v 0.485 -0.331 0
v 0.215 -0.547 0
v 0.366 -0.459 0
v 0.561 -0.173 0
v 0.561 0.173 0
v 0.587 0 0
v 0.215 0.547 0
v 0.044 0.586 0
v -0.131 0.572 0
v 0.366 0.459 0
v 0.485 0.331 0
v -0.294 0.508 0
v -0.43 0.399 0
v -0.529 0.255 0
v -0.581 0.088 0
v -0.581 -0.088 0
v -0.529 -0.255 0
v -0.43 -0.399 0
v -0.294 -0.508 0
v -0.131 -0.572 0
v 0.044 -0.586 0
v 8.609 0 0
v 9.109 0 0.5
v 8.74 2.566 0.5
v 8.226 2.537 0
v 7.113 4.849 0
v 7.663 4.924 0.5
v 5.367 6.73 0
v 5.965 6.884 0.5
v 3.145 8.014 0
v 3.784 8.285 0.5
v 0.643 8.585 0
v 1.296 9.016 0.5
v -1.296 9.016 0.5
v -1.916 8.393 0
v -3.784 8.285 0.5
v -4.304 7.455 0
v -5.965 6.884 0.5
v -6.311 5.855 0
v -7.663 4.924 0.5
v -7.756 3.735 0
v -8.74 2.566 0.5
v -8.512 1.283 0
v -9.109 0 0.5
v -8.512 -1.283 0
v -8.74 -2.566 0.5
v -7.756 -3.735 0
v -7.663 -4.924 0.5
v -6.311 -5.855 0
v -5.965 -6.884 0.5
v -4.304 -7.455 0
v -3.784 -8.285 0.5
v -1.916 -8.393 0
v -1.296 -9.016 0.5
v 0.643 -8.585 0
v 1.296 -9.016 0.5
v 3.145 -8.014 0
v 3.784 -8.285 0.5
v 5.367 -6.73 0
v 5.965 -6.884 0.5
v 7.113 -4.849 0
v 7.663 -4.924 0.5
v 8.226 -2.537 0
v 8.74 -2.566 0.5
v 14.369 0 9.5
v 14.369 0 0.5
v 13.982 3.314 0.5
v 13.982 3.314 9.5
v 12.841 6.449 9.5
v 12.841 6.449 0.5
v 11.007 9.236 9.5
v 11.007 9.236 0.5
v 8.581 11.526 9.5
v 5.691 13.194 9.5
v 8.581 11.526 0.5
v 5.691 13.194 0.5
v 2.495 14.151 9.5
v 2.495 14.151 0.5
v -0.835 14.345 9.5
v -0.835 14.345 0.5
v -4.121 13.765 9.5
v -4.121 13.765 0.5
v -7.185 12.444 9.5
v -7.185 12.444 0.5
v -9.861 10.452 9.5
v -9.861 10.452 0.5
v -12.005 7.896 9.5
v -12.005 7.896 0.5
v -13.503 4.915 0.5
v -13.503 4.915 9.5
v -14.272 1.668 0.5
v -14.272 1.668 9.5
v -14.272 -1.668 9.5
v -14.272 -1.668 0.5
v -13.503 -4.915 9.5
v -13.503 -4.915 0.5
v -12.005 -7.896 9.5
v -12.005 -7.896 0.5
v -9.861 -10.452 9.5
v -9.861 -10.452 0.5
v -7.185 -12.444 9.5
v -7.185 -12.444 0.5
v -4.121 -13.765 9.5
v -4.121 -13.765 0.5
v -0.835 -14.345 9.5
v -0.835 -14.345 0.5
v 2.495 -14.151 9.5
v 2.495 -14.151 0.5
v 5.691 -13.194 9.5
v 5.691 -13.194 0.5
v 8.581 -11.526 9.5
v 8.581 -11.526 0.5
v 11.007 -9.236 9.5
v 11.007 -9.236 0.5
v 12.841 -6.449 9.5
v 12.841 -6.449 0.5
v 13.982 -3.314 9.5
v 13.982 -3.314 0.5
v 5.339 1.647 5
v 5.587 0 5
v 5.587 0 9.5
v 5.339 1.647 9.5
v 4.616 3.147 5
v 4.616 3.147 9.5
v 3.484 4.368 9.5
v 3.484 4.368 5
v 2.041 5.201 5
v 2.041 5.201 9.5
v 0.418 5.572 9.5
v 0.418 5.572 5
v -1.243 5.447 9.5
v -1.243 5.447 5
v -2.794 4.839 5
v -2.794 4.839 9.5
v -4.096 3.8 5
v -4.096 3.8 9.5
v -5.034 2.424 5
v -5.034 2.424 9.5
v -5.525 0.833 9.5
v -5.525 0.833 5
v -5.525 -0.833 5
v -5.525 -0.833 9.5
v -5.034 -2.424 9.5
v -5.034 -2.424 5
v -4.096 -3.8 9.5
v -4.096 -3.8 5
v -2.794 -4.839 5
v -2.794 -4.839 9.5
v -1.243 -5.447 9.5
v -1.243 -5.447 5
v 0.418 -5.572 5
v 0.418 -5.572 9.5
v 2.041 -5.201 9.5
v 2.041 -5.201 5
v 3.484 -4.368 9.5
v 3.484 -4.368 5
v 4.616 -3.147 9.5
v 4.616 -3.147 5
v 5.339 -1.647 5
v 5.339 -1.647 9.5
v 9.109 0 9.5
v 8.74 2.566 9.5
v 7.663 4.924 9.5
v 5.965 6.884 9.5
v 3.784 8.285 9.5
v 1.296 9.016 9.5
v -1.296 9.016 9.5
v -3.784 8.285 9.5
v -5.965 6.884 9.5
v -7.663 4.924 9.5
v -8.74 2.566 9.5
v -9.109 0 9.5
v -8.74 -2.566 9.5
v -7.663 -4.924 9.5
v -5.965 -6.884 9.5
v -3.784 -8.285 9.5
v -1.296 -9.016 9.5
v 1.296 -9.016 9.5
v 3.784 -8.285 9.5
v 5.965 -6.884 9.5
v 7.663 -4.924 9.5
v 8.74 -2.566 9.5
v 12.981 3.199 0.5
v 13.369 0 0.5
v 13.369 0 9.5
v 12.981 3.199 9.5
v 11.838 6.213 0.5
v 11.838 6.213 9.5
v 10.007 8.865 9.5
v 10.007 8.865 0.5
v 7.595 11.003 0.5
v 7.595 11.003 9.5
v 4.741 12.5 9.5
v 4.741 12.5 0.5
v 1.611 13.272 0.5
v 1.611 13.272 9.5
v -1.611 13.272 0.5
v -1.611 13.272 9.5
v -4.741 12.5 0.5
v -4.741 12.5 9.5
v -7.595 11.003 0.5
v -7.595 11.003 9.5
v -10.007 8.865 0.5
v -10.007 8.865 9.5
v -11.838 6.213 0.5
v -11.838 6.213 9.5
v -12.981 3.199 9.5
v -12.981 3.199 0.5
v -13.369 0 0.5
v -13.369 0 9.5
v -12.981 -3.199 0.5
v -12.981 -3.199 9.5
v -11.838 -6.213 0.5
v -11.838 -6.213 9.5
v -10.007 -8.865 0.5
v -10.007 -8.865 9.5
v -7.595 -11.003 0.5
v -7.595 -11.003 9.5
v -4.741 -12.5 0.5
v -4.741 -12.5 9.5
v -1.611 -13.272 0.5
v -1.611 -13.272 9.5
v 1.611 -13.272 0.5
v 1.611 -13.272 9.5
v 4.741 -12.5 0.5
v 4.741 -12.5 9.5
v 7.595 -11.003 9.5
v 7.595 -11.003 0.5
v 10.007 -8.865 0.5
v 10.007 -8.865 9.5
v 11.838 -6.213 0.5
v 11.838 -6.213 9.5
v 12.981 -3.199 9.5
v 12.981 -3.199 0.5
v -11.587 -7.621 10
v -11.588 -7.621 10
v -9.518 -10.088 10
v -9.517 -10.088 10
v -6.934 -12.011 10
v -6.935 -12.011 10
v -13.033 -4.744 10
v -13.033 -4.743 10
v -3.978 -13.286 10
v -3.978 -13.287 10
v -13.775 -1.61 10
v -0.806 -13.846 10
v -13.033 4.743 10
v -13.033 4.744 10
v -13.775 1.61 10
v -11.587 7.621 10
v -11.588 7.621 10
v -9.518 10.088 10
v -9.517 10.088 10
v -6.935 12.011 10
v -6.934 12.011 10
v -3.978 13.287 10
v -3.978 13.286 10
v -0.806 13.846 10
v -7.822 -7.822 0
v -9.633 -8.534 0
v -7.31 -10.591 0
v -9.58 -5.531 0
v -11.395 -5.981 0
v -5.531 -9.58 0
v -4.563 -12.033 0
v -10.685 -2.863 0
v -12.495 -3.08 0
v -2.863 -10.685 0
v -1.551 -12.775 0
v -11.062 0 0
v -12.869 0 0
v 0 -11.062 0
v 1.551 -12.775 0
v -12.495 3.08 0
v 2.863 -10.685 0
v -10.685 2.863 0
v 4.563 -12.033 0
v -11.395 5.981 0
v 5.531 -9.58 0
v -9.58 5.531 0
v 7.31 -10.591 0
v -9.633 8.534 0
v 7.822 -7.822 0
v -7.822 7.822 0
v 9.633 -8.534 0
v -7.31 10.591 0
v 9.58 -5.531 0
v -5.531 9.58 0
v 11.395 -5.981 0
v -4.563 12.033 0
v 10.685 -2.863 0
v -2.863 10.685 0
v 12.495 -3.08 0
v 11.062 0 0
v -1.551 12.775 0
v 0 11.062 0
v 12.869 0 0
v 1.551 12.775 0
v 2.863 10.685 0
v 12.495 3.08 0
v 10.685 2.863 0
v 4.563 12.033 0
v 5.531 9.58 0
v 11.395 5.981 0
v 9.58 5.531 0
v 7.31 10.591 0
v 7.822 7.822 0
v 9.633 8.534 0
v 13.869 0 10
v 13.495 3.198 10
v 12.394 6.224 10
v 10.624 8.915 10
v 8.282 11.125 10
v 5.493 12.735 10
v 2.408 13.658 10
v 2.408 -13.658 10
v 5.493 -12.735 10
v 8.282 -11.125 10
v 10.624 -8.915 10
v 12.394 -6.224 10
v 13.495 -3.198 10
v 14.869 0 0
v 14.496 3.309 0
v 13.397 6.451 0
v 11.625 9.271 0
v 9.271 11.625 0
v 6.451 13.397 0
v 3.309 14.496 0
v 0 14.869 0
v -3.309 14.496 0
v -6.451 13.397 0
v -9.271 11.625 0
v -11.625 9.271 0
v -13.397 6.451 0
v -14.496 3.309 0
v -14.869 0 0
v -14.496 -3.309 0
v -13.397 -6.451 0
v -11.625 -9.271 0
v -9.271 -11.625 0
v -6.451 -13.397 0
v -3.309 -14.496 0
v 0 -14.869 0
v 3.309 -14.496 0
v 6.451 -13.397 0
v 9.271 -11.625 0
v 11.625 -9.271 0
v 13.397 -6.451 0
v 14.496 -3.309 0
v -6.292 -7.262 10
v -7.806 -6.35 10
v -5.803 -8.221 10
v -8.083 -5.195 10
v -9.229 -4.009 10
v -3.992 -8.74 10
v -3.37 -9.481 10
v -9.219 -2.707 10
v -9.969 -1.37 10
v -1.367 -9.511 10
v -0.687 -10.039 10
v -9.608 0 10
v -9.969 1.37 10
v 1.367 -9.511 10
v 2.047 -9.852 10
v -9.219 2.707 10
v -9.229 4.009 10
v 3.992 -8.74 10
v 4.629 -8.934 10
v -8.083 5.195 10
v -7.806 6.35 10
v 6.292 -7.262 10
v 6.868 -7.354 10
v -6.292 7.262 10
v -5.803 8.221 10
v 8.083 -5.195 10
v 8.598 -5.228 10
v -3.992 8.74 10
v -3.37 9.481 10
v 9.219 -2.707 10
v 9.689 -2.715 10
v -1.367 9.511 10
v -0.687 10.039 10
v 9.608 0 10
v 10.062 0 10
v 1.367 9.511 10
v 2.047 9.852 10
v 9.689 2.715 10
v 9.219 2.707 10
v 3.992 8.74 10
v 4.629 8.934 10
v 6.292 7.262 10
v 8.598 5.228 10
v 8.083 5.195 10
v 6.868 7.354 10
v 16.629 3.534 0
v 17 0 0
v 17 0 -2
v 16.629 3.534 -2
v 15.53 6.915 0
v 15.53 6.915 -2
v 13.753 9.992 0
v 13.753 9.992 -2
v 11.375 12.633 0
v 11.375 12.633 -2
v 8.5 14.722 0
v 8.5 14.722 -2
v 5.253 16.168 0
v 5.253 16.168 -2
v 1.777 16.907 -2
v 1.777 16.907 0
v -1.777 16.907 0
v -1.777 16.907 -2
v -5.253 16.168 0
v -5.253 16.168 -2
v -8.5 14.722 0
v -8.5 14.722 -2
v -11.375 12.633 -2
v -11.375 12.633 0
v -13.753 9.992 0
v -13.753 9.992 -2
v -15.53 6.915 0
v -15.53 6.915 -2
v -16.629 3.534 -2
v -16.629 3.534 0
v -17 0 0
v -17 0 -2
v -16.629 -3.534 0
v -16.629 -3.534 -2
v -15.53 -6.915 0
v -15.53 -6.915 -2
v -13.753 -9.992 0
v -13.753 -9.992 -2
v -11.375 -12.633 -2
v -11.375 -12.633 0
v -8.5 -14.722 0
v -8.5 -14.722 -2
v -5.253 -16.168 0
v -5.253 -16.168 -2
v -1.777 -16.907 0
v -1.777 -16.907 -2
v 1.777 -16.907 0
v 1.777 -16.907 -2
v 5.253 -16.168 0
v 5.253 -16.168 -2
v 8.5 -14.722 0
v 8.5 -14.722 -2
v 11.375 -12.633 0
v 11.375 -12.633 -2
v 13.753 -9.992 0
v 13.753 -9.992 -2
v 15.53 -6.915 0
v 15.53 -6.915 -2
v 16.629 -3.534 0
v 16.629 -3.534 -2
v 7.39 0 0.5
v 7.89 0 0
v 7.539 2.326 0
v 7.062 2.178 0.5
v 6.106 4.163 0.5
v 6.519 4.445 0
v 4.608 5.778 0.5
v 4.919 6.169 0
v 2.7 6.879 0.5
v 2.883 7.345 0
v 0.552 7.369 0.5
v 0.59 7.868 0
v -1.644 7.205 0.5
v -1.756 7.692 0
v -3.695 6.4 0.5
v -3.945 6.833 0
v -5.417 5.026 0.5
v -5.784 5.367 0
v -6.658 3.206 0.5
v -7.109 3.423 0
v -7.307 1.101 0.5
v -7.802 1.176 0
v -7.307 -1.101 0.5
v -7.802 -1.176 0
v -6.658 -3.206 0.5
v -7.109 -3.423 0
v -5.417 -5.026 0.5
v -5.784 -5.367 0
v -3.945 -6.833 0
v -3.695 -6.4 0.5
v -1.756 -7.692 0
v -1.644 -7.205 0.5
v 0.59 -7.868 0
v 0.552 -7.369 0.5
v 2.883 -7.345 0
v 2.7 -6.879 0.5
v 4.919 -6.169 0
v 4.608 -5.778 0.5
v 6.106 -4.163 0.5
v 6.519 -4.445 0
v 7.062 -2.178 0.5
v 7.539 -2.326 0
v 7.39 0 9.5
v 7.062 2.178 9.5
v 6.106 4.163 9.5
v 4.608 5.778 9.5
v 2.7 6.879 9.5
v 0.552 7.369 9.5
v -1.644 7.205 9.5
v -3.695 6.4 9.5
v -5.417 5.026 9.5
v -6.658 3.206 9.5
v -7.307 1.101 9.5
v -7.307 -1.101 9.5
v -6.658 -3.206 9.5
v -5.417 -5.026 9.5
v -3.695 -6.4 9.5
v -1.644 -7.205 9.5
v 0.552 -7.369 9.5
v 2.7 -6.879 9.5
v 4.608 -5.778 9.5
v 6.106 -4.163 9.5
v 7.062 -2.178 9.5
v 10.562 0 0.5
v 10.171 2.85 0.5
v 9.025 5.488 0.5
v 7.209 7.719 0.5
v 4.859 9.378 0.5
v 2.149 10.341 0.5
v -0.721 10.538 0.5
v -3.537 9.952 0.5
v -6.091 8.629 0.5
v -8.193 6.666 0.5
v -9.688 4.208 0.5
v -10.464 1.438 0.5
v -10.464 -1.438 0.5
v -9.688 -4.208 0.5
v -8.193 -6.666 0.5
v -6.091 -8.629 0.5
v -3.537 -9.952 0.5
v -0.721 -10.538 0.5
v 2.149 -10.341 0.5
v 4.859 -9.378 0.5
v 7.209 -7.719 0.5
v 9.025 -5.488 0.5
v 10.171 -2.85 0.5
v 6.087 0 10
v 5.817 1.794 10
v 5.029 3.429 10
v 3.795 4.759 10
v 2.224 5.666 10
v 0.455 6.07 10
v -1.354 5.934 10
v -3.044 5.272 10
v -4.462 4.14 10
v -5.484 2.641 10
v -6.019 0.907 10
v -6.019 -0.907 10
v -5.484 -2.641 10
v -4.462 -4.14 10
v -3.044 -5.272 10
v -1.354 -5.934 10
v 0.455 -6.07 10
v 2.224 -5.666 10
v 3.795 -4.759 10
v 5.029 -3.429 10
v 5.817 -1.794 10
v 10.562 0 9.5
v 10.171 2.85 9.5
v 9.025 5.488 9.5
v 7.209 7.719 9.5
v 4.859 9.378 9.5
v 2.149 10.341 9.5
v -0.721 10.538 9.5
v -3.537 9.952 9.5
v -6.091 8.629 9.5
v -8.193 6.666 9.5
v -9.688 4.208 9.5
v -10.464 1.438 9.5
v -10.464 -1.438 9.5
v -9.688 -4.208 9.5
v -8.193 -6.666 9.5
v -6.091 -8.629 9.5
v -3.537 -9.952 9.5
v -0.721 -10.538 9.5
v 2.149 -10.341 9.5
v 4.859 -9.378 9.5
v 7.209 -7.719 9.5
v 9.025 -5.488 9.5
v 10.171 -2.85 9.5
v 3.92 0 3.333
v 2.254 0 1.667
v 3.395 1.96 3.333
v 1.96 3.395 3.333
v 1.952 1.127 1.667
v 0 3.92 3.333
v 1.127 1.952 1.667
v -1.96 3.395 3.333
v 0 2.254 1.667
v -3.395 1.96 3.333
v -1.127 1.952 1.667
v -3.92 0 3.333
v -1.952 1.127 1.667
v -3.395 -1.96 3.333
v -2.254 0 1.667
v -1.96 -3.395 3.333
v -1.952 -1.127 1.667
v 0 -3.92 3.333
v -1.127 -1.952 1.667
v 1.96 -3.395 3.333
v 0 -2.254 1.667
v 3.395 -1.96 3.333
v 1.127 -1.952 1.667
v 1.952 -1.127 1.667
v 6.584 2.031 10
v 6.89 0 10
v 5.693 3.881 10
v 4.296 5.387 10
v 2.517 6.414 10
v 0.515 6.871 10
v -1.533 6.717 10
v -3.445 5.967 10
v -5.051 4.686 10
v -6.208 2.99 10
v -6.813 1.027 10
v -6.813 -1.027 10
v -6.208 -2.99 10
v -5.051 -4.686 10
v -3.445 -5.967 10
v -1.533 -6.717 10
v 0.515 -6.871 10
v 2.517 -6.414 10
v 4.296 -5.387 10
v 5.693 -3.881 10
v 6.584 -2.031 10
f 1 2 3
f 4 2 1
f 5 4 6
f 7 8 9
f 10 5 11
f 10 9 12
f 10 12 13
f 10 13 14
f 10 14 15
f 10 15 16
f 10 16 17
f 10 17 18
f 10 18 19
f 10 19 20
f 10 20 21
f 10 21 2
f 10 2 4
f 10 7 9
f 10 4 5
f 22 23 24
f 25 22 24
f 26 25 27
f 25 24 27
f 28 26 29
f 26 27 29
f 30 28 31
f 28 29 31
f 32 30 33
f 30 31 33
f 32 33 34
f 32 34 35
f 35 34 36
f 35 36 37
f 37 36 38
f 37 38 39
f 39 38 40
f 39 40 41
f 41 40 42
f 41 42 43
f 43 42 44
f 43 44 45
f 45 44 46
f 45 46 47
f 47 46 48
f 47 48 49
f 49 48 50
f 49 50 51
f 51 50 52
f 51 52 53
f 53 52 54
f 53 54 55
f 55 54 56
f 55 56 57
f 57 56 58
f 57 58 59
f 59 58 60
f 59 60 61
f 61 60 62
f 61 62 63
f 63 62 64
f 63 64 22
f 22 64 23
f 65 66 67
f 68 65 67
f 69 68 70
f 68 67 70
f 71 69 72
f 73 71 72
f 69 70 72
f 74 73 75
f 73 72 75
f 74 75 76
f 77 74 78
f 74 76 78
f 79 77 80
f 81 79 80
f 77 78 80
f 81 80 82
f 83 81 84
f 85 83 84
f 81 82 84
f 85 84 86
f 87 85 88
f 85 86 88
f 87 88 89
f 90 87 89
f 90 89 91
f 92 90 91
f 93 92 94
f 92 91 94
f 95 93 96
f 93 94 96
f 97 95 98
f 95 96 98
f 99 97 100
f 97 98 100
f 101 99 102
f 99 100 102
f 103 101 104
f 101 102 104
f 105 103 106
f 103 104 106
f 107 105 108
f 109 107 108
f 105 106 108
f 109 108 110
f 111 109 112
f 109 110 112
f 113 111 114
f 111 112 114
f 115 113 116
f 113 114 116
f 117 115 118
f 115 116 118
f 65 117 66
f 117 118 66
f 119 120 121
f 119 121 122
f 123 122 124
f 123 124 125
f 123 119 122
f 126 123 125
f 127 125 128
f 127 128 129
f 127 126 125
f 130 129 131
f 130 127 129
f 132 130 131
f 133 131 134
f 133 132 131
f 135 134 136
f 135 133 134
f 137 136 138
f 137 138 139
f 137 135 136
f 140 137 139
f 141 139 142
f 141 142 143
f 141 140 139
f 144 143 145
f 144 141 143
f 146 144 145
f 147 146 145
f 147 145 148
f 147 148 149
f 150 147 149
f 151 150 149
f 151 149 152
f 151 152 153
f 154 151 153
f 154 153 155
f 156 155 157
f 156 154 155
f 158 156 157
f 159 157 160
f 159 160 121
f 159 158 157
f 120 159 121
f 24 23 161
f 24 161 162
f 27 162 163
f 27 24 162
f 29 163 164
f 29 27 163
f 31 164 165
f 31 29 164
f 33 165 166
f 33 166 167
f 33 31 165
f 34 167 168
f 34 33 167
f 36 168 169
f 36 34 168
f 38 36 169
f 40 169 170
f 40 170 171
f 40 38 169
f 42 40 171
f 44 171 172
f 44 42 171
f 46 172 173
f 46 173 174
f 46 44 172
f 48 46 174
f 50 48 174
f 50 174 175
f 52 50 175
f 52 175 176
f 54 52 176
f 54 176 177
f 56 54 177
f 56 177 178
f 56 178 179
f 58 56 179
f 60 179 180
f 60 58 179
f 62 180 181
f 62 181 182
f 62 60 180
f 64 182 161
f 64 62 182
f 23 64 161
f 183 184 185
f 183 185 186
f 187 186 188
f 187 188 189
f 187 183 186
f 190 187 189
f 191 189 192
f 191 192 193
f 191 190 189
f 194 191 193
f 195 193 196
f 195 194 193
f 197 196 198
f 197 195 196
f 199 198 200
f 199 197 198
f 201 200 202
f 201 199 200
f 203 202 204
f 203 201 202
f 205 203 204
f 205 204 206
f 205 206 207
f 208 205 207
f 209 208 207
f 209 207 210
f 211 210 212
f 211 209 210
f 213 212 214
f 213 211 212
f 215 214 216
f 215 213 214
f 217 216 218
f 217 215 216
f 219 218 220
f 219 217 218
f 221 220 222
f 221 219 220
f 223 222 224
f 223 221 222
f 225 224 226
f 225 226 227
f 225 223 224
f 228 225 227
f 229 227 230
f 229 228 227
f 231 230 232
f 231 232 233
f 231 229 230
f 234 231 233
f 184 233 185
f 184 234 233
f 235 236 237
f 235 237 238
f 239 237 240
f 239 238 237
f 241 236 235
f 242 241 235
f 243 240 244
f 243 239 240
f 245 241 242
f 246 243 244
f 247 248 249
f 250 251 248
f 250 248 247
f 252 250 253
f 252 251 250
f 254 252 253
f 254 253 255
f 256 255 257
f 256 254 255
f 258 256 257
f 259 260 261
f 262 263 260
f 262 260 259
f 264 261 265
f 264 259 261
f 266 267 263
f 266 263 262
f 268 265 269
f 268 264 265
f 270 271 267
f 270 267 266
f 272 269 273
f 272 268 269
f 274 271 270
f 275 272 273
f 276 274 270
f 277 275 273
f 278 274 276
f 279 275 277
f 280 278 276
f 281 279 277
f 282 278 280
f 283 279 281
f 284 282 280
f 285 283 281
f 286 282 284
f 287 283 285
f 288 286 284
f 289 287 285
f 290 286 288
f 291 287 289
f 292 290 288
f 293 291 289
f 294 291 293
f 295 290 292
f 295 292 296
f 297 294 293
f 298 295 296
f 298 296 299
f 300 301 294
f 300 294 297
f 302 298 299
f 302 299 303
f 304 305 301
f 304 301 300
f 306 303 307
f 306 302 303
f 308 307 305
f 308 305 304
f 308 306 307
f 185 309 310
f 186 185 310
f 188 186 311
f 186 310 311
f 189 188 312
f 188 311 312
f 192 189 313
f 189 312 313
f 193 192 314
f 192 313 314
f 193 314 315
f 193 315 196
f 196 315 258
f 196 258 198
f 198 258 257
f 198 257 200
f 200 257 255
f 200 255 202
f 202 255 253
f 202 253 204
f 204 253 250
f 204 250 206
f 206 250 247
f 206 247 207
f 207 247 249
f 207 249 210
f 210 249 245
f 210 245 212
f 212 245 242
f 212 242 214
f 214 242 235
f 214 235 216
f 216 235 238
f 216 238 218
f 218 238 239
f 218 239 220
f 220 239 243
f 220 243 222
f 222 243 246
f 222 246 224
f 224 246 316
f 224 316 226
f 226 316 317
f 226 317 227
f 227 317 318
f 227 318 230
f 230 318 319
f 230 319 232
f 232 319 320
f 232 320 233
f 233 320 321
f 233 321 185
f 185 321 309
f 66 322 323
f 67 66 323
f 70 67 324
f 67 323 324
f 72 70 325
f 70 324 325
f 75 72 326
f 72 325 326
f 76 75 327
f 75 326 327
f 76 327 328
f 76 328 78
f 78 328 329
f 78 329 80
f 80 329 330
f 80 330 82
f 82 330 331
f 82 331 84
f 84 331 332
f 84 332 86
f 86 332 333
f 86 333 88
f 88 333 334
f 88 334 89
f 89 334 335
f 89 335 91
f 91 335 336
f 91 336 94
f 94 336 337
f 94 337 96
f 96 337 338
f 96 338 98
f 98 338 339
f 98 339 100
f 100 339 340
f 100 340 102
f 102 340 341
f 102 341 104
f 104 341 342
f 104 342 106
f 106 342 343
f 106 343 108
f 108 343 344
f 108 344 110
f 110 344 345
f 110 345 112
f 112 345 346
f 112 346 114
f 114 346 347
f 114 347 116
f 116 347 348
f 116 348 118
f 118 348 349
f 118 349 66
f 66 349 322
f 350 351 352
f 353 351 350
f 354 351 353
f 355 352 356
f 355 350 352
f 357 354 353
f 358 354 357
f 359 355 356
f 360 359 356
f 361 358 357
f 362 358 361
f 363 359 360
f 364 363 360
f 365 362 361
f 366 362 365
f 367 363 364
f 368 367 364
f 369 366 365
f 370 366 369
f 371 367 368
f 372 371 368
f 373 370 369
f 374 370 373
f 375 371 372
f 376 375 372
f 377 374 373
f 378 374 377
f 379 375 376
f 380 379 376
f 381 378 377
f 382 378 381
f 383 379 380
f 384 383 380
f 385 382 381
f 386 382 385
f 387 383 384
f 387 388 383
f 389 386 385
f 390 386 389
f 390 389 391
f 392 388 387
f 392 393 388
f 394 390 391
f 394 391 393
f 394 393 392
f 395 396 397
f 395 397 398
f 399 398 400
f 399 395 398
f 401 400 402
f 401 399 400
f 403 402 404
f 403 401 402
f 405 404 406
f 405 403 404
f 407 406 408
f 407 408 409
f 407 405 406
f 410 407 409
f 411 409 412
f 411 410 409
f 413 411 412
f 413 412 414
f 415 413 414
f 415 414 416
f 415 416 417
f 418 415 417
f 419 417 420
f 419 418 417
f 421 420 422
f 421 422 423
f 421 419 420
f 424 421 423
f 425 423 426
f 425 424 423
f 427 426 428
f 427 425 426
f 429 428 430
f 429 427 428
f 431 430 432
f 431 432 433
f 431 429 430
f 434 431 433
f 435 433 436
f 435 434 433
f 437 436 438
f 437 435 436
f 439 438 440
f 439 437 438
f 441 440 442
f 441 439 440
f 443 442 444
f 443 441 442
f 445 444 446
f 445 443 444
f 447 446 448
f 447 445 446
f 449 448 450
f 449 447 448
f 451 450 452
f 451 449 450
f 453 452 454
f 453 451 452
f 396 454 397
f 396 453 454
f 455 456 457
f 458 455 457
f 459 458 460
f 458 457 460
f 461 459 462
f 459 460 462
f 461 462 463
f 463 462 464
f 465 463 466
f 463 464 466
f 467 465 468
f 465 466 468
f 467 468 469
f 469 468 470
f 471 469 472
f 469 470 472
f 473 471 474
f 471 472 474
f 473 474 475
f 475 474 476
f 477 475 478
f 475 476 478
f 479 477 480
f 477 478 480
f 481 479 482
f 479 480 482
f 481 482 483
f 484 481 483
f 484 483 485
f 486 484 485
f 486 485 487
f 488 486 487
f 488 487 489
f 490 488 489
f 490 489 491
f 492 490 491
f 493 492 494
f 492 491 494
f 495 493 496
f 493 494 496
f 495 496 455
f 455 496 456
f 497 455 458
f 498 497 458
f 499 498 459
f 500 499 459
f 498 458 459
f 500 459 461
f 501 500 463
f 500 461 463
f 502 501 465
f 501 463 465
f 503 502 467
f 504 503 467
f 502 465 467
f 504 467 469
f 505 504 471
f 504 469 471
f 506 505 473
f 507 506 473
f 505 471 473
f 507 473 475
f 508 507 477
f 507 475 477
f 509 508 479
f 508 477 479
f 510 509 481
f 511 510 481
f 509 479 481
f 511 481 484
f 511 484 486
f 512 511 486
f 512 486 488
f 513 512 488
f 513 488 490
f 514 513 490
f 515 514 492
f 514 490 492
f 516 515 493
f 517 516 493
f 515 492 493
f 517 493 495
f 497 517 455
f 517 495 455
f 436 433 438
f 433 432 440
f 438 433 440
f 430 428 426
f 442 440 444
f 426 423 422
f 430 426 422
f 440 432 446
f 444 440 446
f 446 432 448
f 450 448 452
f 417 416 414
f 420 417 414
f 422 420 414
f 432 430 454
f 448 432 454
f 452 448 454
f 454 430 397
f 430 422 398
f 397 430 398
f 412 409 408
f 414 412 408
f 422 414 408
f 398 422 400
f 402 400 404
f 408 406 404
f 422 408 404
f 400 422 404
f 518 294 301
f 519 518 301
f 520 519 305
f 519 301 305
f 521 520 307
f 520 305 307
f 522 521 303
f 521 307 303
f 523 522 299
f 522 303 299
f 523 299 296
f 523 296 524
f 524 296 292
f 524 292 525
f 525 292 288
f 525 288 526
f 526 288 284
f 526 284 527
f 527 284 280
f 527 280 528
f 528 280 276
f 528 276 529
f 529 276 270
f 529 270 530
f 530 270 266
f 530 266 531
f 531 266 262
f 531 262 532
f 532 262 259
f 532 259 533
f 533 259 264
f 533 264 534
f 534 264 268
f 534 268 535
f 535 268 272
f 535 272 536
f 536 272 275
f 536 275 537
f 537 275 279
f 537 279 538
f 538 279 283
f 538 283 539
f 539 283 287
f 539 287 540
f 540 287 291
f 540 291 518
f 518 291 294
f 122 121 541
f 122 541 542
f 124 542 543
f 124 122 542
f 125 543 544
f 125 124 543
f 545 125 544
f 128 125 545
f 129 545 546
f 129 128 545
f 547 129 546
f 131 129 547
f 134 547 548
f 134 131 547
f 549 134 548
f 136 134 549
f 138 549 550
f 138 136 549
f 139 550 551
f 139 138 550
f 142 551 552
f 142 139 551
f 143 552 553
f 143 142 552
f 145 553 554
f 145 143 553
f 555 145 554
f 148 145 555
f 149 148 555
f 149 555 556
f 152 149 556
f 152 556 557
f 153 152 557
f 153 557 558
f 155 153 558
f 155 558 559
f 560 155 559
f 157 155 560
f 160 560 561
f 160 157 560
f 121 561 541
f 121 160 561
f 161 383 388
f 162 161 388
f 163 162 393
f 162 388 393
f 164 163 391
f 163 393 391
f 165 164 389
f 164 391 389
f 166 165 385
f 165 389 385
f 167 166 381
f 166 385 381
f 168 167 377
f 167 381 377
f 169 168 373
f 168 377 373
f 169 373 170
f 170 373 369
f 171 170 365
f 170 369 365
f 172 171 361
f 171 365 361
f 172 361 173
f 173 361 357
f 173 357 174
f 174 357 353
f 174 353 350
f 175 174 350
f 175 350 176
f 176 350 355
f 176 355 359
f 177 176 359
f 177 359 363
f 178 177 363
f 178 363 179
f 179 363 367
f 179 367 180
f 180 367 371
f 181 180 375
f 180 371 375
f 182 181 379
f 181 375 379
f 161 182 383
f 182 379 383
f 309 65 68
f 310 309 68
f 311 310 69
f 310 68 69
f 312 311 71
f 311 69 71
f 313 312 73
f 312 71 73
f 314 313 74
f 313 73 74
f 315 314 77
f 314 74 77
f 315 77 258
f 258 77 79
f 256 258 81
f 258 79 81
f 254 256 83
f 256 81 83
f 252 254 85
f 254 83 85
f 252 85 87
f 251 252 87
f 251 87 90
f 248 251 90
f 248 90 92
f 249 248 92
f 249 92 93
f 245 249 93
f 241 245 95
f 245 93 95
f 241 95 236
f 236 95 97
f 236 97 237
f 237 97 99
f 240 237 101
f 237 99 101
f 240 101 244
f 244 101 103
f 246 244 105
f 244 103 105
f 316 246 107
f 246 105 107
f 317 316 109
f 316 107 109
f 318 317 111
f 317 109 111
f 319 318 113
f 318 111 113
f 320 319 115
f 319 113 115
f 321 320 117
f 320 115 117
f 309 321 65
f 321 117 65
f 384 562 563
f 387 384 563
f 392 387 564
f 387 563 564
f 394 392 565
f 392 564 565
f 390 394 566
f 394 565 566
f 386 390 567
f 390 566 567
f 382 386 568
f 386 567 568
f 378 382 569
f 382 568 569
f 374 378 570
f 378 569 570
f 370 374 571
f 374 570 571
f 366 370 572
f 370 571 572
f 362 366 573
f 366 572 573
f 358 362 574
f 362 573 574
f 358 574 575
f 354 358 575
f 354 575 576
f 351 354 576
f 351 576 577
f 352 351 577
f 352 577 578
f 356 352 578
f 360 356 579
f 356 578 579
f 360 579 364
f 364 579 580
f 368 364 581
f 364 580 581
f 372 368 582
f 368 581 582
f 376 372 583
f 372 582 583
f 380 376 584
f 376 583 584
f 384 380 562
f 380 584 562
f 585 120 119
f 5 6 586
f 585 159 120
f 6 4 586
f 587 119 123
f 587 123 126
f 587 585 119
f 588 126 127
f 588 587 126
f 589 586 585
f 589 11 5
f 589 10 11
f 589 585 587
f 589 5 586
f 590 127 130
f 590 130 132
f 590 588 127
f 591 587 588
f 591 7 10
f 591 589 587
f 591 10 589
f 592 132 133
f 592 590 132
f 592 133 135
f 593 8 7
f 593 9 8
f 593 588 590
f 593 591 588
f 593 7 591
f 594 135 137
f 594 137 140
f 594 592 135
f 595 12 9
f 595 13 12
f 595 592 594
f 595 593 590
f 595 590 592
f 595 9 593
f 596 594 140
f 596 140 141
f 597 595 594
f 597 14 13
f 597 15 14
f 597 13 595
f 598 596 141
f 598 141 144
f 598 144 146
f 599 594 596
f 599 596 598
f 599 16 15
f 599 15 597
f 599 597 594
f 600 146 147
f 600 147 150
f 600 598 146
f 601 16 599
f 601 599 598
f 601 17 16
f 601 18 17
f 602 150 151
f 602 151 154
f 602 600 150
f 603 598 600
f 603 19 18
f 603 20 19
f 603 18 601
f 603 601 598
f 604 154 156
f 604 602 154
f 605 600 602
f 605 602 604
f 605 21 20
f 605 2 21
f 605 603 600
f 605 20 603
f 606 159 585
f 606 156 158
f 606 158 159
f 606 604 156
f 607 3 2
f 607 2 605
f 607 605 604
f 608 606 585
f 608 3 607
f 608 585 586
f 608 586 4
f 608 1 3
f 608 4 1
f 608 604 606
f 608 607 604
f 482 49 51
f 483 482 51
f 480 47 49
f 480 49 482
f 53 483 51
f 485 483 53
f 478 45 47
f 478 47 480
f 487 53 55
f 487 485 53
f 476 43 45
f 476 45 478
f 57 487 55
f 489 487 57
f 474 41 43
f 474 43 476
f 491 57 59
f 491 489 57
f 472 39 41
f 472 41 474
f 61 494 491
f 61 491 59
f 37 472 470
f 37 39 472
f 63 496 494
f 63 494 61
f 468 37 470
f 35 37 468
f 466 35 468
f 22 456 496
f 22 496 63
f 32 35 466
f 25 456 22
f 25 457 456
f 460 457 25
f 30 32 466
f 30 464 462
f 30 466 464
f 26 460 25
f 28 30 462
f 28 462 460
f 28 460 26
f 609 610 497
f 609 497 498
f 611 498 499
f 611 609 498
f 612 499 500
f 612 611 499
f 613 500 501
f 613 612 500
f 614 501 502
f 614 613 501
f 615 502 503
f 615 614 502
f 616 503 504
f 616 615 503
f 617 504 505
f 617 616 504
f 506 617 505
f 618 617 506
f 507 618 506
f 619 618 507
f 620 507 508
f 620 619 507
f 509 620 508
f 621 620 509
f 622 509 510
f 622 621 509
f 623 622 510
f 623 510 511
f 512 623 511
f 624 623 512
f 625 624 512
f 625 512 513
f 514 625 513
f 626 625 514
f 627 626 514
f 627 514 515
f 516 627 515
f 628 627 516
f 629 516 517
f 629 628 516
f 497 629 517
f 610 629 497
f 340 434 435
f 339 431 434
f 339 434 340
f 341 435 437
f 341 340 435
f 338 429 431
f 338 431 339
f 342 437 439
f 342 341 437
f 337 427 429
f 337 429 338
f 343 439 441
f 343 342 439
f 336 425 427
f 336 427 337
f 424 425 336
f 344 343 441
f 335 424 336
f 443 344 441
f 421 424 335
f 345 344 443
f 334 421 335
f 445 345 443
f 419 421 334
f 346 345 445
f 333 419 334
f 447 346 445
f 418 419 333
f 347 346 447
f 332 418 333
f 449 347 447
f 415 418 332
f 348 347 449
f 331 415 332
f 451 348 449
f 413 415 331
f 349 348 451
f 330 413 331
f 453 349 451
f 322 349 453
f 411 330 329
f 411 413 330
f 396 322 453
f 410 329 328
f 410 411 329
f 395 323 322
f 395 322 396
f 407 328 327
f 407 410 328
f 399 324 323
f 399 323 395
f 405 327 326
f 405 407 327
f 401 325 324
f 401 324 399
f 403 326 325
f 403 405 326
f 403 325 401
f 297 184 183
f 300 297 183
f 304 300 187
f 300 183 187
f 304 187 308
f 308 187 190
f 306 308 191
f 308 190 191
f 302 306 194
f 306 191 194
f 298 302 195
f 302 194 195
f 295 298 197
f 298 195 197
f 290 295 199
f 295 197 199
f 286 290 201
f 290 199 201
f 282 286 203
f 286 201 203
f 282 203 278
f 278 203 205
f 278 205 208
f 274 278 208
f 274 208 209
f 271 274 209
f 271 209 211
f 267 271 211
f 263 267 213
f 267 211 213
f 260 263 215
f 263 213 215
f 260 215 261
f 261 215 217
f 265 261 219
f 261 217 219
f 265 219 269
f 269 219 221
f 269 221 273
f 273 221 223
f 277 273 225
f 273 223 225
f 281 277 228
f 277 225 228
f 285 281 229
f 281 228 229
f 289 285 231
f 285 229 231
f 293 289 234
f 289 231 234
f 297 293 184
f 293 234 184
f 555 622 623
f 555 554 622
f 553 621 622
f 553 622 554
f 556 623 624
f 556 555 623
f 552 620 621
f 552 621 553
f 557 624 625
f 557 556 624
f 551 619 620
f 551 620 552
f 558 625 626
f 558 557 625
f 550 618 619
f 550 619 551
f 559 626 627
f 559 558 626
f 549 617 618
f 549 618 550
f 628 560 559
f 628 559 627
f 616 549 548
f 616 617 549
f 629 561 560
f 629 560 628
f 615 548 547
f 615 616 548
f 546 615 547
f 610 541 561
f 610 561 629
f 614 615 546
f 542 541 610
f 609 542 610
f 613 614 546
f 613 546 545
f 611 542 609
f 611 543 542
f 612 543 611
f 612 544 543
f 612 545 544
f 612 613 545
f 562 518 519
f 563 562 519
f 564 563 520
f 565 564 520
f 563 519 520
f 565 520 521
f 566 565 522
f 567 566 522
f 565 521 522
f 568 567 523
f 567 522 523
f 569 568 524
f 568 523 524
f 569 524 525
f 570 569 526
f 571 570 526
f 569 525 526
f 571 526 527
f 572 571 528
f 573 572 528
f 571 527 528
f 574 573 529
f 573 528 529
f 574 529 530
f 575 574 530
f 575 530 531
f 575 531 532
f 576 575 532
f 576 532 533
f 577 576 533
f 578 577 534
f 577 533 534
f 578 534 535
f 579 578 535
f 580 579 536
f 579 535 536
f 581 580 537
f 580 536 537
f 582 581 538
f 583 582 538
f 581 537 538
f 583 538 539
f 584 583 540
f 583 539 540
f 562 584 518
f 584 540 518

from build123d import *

# Parameters (mm, degrees)
SKETCH1_R           = 17
SKETCH1_R_2         = 15.796210214
SKETCH1_R_3         = 14.369088414
SKETCH1_R_4         = 13.369088414
SKETCH1_R_5         = 10.562338101
SKETCH1_R_6         = 9.108597541
SKETCH1_R_7         = 7.390019335
SKETCH1_R_8         = 5.587157692
BOSS_EXTRUDE1_DEPTH = 2
SKETCH1_3_R         = 14.369088414
SKETCH1_3_R_2       = 13.369088414
SKETCH1_3_R_3       = 10.562338101
SKETCH1_3_R_4       = 9.108597541
SKETCH1_3_R_5       = 7.390019335
SKETCH1_3_R_6       = 5.587157692
BOSS_EXTRUDE2_DEPTH = 10
CHAMFER3_SIZE       = 5
CHAMFER4_SIZE       = 0.5
CHAMFER5_SIZE       = 0.5


with BuildPart() as part:
    # Sketch1 → Boss-Extrude1 (new body)
    # profile 1 of 8: a face of its own
    with BuildSketch(Plane.XY):
        Circle(SKETCH1_R)
        Circle(SKETCH1_R_2, mode=Mode.SUBTRACT)
    # profile 2 of 8: a face of its own
    with BuildSketch(Plane.XY):
        Circle(SKETCH1_R_2)
        Circle(SKETCH1_R_3, mode=Mode.SUBTRACT)
    # profile 3 of 8: a face of its own
    with BuildSketch(Plane.XY):
        Circle(SKETCH1_R_3)
        Circle(SKETCH1_R_4, mode=Mode.SUBTRACT)
    # profile 4 of 8: a face of its own
    with BuildSketch(Plane.XY):
        Circle(SKETCH1_R_4)
        Circle(SKETCH1_R_5, mode=Mode.SUBTRACT)
    # profile 5 of 8: a face of its own
    with BuildSketch(Plane.XY):
        Circle(SKETCH1_R_5)
        Circle(SKETCH1_R_6, mode=Mode.SUBTRACT)
    # profile 6 of 8: a face of its own
    with BuildSketch(Plane.XY):
        Circle(SKETCH1_R_6)
        Circle(SKETCH1_R_7, mode=Mode.SUBTRACT)
    # profile 7 of 8: a face of its own
    with BuildSketch(Plane.XY):
        Circle(SKETCH1_R_7)
        Circle(SKETCH1_R_8, mode=Mode.SUBTRACT)
    # profile 8 of 8: a face of its own
    with BuildSketch(Plane.XY):
        Circle(SKETCH1_R_8)
    extrude(amount=-BOSS_EXTRUDE1_DEPTH)

    # Sketch1<3> → Boss-Extrude2 (add)
    # profile 1 of 3: a face of its own
    with BuildSketch(Plane.XY):
        Circle(SKETCH1_3_R)
        Circle(SKETCH1_3_R_2, mode=Mode.SUBTRACT)
    # profile 2 of 3: a face of its own
    with BuildSketch(Plane.XY):
        Circle(SKETCH1_3_R_3)
        Circle(SKETCH1_3_R_4, mode=Mode.SUBTRACT)
    # profile 3 of 3: a face of its own
    with BuildSketch(Plane.XY):
        Circle(SKETCH1_3_R_5)
        Circle(SKETCH1_3_R_6, mode=Mode.SUBTRACT)
    extrude(amount=BOSS_EXTRUDE2_DEPTH)

    # Chamfer3
    chamfer3_edges = [part.edges().sort_by_distance(p)[0] for p in [
        (-5.587157692, 0, 0),
    ]]
    chamfer(chamfer3_edges, length=CHAMFER3_SIZE)

    # Chamfer4
    chamfer4_edges = [part.edges().sort_by_distance(p)[0] for p in [
        (-9.108597541, 0, 0),
        (-10.562338101, 0, 0),
        (-7.390019335, 0, 0),
        (-14.369088414, 0, 0),
        (-13.369088414, 0, 0),
    ]]
    chamfer(chamfer4_edges, length=CHAMFER4_SIZE)

    # Chamfer5
    chamfer5_edges = [part.edges().sort_by_distance(p)[0] for p in [
        (-9.108597541, 0, 10),
        (-10.562338101, 0, 10),
        (-5.587157692, 0, 10),
        (-7.390019335, 0, 10),
        (-13.369088414, 0, 10),
        (-14.369088414, 0, 10),
    ]]
    chamfer(chamfer5_edges, length=CHAMFER5_SIZE - 0.0001)  # a hair under: the kernel refuses the full size


solid = part.part
